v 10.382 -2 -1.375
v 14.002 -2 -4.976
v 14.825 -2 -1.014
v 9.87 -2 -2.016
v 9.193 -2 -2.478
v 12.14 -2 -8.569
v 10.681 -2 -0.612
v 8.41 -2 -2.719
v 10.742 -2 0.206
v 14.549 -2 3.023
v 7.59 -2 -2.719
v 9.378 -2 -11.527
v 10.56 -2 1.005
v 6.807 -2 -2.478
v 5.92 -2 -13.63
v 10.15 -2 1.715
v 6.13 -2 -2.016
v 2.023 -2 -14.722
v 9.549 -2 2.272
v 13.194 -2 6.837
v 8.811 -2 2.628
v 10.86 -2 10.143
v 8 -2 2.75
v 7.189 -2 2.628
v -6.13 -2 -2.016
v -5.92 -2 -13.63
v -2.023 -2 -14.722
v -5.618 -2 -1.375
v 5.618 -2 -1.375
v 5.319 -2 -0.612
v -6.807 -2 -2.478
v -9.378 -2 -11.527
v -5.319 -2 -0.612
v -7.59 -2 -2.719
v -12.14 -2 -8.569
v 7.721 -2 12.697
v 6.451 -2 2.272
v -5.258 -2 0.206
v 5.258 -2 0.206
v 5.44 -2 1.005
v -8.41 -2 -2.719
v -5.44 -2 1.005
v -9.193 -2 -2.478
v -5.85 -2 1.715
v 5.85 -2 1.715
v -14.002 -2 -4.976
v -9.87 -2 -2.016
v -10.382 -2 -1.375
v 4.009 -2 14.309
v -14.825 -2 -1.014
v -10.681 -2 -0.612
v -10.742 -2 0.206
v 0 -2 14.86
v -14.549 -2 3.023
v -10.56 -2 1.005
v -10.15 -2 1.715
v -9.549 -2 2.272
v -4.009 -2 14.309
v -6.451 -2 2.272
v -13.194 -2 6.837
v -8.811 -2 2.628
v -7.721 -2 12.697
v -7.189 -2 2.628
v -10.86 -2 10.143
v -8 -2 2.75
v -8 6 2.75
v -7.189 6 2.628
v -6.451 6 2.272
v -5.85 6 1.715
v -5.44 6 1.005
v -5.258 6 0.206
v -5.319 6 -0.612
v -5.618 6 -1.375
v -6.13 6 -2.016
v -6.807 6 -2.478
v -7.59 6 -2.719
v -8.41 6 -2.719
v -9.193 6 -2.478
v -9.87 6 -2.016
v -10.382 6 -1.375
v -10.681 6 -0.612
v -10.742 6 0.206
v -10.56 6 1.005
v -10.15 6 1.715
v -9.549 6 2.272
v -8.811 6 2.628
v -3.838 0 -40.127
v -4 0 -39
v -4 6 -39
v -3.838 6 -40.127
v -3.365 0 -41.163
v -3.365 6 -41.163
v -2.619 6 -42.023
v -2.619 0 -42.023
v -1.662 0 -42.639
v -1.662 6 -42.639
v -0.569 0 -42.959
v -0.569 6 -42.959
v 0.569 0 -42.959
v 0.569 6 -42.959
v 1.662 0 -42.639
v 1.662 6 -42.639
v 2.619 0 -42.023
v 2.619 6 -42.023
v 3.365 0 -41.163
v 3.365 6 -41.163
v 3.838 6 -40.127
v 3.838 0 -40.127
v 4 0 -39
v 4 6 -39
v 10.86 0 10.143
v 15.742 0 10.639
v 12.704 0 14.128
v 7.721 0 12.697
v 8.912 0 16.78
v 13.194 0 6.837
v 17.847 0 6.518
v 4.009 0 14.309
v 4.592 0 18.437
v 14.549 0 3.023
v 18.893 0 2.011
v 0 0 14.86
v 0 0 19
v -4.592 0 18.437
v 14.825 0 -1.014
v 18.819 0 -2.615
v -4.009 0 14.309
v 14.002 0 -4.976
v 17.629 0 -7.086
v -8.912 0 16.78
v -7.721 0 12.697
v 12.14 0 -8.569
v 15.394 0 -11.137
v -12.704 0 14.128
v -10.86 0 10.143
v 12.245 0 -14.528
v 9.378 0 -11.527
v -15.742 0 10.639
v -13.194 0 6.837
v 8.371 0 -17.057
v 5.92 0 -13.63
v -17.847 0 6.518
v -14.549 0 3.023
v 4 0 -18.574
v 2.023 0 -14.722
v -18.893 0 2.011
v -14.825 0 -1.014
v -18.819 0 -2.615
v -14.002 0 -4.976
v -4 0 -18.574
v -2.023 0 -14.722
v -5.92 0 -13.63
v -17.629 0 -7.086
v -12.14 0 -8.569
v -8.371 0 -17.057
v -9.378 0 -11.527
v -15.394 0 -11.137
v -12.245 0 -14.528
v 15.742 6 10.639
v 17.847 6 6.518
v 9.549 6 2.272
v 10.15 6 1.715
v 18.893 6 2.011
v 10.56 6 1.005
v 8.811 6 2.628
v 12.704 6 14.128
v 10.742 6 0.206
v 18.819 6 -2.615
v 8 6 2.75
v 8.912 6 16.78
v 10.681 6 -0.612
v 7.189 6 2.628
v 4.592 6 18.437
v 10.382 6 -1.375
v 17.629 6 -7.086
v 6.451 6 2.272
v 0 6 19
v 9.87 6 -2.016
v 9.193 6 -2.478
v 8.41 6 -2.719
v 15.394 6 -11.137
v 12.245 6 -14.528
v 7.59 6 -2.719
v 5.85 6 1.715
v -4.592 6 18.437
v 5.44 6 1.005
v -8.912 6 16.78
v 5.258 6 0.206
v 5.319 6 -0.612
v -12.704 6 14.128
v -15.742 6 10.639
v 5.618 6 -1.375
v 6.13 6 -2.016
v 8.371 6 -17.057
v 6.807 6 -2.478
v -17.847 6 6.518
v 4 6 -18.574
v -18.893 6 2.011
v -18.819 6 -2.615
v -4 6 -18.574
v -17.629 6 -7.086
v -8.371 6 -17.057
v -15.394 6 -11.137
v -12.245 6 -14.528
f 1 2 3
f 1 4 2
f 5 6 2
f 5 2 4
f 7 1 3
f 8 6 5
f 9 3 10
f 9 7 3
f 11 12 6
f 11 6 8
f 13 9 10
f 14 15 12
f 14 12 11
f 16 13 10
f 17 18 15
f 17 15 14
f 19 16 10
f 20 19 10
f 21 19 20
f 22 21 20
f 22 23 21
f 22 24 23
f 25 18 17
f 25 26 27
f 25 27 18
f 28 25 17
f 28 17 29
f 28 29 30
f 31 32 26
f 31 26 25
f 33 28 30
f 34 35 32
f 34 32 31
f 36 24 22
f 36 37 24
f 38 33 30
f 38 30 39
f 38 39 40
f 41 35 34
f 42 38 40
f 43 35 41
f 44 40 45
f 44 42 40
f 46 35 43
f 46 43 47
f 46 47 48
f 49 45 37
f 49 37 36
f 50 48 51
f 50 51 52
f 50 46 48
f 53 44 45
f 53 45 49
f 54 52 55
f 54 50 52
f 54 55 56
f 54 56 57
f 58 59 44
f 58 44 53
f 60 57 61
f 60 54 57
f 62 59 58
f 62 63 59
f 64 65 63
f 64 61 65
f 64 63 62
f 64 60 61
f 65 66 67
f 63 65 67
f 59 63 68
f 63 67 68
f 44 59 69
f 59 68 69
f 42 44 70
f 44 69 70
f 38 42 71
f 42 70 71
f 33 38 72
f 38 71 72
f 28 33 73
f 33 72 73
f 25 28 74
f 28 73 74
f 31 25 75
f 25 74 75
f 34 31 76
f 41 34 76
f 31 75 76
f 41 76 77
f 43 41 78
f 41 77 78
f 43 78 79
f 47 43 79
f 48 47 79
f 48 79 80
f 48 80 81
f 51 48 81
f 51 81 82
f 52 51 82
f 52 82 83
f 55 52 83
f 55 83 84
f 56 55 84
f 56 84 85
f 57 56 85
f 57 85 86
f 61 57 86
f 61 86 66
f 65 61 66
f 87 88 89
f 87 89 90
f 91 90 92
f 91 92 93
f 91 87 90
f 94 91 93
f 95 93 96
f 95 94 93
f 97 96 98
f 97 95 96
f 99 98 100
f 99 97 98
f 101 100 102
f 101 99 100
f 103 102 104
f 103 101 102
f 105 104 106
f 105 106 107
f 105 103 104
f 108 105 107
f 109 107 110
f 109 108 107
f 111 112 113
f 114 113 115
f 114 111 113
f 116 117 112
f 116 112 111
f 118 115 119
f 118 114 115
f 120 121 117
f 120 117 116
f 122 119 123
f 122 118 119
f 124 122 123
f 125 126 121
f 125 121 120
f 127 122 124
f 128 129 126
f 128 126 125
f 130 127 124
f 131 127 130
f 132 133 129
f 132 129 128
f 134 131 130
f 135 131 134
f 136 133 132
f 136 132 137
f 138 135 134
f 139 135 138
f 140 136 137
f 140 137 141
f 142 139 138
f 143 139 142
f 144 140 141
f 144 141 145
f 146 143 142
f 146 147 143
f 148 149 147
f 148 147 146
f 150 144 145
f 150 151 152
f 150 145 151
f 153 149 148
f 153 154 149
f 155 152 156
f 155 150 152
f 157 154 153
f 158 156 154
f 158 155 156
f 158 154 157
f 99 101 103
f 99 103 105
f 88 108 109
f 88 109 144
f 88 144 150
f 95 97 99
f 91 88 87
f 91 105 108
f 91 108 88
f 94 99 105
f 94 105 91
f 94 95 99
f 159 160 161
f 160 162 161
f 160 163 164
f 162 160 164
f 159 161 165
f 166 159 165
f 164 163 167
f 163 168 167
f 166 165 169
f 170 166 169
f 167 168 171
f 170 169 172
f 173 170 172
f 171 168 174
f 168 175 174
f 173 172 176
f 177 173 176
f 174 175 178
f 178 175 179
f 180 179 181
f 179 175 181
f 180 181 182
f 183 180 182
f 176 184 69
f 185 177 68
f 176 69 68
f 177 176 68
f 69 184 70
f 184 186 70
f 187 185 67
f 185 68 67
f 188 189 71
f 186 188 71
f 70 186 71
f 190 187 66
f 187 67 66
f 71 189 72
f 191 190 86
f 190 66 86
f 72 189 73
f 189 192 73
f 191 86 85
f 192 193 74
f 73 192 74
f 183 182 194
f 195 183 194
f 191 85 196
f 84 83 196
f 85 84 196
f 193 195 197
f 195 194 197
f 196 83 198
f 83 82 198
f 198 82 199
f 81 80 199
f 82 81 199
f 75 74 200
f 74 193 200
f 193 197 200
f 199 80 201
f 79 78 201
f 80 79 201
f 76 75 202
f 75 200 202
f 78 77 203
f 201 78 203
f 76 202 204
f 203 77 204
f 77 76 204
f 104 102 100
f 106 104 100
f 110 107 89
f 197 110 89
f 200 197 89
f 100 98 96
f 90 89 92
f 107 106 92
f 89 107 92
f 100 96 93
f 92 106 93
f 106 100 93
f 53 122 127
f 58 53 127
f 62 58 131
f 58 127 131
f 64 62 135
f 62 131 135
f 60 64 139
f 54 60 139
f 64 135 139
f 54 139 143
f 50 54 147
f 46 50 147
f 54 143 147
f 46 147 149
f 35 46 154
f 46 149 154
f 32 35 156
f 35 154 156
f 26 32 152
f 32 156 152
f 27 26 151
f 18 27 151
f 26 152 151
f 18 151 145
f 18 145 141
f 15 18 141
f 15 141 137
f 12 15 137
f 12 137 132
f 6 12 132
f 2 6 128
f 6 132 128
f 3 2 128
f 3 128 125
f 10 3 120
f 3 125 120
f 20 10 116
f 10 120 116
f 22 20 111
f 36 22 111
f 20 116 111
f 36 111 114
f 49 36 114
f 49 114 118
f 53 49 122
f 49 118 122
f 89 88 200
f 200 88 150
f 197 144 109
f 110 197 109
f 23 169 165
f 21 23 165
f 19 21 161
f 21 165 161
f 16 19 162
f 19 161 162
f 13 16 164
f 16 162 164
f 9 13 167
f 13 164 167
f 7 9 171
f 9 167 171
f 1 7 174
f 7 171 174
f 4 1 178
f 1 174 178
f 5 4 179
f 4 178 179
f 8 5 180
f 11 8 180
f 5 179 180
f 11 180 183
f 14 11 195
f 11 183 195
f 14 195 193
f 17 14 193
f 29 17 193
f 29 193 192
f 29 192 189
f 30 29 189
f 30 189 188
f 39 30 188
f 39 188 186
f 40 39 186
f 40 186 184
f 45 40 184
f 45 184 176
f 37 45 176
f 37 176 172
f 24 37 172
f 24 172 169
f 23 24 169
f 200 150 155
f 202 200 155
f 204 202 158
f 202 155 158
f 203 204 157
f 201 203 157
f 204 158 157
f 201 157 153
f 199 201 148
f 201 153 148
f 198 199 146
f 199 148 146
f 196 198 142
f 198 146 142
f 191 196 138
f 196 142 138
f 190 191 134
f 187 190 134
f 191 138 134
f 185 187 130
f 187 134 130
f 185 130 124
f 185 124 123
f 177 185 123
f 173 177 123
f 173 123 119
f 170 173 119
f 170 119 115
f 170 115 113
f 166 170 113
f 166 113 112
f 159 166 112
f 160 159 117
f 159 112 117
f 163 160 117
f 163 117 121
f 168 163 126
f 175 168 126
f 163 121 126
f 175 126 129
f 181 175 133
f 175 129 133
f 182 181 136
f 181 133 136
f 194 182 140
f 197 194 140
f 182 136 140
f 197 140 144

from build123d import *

# Parameters (mm, degrees)
SKETCH1_R           = 19
BOSS_EXTRUDE1_DEPTH = 6
SKETCH3_R           = 14.86
BOSS_EXTRUDE2_DEPTH = 2
SKETCH2_R           = 2.75
CUT_EXTRUDE1_DEPTH  = 10


with BuildPart() as part:
    # Sketch1 → Boss-Extrude1 (new body)
    with BuildSketch(Plane(origin=(0, 0, 0), x_dir=(1, 0, 0), z_dir=(0, 1, 0))):
        with BuildLine():
            ThreePointArc((-4, 39), (0, 43), (4, 39))
            Line((4, 39), (0, 39))
            Line((0, 39), (-4, 39))
        make_face()
        with BuildLine():
            ThreePointArc((-4, 18.574175621), (-2.011300972, 18.893243988), (0, 19))
            Line((0, 19), (0, 39))
            Line((0, 39), (-4, 39))
            Line((-4, 39), (-4, 18.574175621))
        make_face()
        with BuildLine():
            Line((0, 39), (0, 19))
            ThreePointArc((0, 19), (2.011300972, 18.893243988), (4, 18.574175621))
            Line((4, 18.574175621), (4, 39))
            Line((4, 39), (0, 39))
        make_face()
        Circle(SKETCH1_R)
    extrude(amount=BOSS_EXTRUDE1_DEPTH)

    # Sketch3 → Boss-Extrude2 (add)
    with BuildSketch(Plane.XZ):
        with Locations(Location((0, 0, 0), (0, 0, 90))):
            Circle(SKETCH3_R)
    extrude(amount=BOSS_EXTRUDE2_DEPTH)

    # Sketch2 → Cut-Extrude1 (cut)
    with BuildSketch(Plane(origin=(0, 6, 0), x_dir=(1, 0, 0), z_dir=(0, 1, 0))):
        with Locations(Location((8, 0, 0), (0, 0, 270))):
            Circle(SKETCH2_R)
        with Locations(Location((-8, 0, 0), (0, 0, 270))):
            Circle(SKETCH2_R)
    extrude(amount=-CUT_EXTRUDE1_DEPTH, mode=Mode.SUBTRACT)


solid = part.part
